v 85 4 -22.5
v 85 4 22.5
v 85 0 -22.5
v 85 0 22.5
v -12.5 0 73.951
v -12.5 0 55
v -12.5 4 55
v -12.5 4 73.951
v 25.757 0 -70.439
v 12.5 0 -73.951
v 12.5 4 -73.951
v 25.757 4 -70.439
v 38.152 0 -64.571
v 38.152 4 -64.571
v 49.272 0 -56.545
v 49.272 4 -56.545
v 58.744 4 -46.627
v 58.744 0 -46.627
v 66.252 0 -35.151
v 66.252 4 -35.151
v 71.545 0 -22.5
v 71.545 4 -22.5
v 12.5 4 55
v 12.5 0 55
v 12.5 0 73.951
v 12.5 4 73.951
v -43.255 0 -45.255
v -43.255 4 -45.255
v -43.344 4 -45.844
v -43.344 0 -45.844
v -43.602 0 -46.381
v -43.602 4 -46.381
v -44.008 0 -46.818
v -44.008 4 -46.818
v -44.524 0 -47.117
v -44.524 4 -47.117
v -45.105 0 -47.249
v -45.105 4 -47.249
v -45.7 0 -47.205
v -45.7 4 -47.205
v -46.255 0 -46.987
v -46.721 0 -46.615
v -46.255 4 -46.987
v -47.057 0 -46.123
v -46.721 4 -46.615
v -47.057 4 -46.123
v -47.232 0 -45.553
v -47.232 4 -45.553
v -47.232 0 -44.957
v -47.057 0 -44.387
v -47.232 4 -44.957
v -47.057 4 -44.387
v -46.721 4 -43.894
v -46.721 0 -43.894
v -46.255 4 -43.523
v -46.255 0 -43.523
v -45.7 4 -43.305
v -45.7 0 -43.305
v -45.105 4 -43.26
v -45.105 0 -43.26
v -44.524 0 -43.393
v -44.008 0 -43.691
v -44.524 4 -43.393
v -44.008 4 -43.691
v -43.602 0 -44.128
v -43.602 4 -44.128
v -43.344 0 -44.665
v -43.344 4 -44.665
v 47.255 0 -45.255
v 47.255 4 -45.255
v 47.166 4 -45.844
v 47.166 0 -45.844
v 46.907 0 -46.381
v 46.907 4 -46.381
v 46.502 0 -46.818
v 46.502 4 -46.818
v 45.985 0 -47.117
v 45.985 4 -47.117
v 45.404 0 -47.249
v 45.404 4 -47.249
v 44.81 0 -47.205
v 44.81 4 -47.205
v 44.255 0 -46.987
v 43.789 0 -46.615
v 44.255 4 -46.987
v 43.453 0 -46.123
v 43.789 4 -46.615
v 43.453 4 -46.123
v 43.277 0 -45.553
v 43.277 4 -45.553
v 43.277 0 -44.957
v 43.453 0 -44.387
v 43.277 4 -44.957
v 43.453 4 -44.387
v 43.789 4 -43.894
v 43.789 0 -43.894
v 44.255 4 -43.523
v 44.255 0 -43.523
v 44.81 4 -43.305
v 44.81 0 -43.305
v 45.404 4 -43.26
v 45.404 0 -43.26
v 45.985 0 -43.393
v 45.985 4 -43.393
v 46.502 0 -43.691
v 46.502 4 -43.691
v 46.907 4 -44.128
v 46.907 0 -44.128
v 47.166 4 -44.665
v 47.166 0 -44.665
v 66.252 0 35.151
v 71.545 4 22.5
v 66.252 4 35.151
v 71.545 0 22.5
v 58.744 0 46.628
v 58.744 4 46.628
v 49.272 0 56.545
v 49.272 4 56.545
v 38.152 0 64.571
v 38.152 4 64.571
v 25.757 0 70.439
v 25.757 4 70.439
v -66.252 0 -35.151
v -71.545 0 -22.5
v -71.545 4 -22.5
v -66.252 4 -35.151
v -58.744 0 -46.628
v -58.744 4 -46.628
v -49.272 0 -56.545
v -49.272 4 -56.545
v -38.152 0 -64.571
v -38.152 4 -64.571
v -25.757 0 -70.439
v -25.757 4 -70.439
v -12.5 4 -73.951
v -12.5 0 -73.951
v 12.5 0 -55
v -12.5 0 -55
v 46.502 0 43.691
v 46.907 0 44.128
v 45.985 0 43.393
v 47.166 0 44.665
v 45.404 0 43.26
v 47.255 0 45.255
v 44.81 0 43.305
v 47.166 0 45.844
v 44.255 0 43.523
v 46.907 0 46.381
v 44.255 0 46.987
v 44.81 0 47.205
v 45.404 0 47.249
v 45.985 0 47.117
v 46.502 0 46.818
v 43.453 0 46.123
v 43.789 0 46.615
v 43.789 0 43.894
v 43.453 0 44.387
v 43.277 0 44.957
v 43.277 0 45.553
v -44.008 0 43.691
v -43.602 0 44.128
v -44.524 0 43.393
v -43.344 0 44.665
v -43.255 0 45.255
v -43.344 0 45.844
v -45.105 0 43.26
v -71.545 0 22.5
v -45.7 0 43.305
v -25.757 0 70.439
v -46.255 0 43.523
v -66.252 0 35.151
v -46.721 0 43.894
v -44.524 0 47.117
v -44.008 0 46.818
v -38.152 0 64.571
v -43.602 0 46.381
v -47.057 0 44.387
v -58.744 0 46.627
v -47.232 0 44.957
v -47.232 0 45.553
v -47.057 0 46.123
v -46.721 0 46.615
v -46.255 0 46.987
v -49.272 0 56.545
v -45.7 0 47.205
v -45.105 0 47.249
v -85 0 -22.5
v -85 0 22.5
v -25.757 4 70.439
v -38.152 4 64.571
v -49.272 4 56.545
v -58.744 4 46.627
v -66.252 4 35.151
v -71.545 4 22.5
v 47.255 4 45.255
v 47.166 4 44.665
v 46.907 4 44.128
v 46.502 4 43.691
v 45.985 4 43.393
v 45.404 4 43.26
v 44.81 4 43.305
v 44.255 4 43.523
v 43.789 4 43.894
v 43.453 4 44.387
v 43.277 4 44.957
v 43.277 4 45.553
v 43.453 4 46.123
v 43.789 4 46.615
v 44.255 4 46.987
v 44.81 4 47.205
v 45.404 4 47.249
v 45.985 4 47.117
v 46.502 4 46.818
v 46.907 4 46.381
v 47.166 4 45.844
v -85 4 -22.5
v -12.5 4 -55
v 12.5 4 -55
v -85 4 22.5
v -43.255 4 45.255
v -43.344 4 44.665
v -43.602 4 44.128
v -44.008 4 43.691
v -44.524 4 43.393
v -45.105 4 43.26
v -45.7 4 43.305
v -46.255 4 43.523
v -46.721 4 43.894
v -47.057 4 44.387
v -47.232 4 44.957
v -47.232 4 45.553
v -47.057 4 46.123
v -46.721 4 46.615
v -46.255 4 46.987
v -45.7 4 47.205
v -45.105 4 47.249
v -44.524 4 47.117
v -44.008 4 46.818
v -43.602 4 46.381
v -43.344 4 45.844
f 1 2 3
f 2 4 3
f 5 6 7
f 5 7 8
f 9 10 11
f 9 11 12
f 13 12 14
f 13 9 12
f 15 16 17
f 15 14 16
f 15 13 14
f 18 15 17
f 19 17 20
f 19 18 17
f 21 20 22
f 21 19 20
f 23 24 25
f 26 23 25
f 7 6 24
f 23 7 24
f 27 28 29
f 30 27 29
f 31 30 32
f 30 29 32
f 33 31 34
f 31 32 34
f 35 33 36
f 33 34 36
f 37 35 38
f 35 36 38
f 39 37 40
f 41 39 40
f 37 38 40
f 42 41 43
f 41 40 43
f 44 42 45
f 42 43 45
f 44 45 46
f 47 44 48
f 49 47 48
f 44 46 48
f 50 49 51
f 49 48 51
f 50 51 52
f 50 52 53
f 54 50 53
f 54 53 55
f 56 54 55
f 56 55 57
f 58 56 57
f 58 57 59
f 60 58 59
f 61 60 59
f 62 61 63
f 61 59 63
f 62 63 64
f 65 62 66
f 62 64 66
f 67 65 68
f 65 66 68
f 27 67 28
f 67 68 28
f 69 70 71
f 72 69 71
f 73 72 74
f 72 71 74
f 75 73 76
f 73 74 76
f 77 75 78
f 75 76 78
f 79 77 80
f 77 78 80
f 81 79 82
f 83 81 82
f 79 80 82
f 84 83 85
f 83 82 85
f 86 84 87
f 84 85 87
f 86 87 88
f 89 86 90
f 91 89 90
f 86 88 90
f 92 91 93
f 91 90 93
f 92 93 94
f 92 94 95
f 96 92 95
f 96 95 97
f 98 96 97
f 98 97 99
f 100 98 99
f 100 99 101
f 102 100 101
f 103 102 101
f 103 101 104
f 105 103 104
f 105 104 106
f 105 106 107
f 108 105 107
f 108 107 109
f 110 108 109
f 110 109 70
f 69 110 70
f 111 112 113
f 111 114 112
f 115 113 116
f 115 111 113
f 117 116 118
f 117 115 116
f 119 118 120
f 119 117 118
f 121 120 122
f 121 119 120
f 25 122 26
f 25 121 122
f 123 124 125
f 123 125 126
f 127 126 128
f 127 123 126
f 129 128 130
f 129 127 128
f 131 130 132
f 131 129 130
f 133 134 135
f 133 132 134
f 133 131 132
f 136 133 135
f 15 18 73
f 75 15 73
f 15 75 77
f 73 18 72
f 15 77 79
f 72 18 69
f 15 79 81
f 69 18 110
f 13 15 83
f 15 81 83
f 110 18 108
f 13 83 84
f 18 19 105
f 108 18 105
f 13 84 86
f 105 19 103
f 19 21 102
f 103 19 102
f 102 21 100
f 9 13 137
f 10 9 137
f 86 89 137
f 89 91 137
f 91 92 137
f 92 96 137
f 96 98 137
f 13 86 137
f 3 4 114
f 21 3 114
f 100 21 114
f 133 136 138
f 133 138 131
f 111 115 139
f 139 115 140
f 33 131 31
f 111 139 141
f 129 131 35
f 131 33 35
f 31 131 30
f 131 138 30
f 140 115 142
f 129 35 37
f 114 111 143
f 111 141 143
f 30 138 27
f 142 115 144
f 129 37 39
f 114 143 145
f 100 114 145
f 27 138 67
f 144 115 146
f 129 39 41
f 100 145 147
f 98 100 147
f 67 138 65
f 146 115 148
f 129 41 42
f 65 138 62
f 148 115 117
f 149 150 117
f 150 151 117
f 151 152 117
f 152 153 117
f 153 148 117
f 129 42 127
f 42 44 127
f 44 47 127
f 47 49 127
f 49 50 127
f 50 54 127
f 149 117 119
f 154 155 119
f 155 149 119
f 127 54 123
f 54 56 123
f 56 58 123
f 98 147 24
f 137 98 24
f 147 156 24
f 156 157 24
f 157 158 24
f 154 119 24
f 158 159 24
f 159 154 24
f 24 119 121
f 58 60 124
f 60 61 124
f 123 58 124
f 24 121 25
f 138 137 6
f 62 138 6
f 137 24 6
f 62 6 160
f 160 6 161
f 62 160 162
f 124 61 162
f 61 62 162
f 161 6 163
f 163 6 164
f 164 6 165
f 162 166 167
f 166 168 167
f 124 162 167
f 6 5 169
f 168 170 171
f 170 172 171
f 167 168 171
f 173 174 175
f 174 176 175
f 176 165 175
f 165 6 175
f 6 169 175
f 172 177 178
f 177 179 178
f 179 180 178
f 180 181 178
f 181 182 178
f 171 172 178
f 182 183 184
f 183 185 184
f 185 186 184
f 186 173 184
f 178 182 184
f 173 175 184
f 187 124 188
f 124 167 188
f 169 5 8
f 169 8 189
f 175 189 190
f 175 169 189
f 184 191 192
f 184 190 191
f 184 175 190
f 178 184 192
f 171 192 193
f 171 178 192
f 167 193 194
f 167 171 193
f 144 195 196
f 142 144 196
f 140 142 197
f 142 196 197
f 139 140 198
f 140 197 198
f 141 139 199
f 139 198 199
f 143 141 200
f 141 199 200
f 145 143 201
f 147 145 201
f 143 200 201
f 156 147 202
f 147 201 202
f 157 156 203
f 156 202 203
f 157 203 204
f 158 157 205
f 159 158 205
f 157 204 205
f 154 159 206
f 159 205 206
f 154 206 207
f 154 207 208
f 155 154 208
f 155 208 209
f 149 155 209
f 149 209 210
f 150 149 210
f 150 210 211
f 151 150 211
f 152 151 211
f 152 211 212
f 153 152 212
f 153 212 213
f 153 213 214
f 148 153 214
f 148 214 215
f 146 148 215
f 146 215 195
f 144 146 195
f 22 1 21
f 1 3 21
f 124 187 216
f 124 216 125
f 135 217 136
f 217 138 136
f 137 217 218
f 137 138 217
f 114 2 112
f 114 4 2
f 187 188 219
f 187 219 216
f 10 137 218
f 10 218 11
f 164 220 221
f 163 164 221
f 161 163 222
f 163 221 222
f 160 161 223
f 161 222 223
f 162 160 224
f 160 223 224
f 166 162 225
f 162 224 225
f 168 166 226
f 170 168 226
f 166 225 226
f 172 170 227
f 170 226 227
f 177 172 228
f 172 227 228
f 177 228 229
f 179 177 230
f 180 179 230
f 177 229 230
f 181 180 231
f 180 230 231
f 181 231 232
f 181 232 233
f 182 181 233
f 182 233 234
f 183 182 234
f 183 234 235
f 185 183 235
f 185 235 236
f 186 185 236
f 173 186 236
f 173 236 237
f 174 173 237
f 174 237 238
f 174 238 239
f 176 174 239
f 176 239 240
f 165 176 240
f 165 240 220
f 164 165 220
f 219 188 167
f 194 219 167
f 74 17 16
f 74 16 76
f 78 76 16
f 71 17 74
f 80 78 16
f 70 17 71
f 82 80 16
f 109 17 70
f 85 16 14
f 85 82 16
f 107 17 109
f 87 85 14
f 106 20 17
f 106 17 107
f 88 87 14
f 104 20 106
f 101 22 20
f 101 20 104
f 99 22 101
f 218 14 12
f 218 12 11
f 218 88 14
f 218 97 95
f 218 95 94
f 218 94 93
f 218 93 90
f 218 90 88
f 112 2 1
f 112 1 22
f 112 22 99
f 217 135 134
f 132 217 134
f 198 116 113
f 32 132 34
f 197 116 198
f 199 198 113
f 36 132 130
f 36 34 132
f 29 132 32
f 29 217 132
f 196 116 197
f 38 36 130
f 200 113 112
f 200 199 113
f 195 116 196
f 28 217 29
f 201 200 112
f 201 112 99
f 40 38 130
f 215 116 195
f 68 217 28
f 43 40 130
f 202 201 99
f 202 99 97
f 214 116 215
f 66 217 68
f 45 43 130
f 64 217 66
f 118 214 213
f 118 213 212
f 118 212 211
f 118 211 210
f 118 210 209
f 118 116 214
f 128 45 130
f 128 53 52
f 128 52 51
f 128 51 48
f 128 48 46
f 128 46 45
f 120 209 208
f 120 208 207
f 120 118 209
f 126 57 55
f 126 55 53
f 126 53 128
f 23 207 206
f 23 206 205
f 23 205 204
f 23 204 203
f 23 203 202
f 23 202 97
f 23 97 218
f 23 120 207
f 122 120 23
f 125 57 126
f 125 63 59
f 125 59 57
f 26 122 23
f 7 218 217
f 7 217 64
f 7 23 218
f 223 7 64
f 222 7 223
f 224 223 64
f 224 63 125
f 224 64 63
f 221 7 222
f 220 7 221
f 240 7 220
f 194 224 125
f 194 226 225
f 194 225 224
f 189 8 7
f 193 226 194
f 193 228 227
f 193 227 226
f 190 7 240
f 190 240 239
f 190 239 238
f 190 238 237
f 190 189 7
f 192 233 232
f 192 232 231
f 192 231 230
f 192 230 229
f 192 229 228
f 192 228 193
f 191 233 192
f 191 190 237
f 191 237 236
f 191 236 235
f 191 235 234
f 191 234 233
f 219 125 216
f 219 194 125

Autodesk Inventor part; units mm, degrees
ref_plane "YZ Plane" through (0, 0, 0) normal (1, 0, 0) x (0, 1, 0)
ref_plane "XZ Plane" through (0, 0, 0) normal (0, 1, 0) x (-1, 0, 0)
ref_plane "XY Plane" through (0, 0, 0) normal (0, 0, 1) x (1, 0, 0)
sketch "Boceto1" plane through (0, 0, 0) normal (0, 1, 0) x (-1, 0, 0)
  line L0 (0, -55) -> (12.5, -55)
  line L1 (12.5, -55) -> (12.5, -73.951)
  line L2 (0, -55) -> (-12.5, -55)
  line L3 (-12.5, -55) -> (-12.5, -73.951)
  line L4 (0, 55) -> (12.5, 55)
  line L5 (12.5, 55) -> (12.5, 73.951)
  line L6 (0, 55) -> (-12.5, 55)
  line L7 (-12.5, 55) -> (-12.5, 73.951)
  line L8 (85, 0) -> (85, -22.5)
  line L9 (85, -22.5) -> (71.5454, -22.5)
  line L10 (85, 0) -> (85, 22.5)
  line L11 (85, 22.5) -> (71.5454, 22.5)
  line L12 (-85, 0) -> (-85, -22.5)
  line L13 (-85, -22.5) -> (-71.5454, -22.5)
  line L14 (-85, 0) -> (-85, 22.5)
  line L15 (-85, 22.5) -> (-71.5454, 22.5)
  arc A0 (12.5, -73.951) -> (71.5454, -22.5) centre (0, 0) ccw
  arc A1 (71.5454, 22.5) -> (12.5, 73.951) centre (0, 0) ccw
  arc A2 (-12.5, 73.951) -> (-71.5454, 22.5) centre (0, 0) ccw
  arc A3 (-71.5454, -22.5) -> (-12.5, -73.951) centre (0, 0) ccw
  dimension "d2" = 12.5
  dimension "d4" = 22.5
extrude "Extrusión1" add sketch "Boceto1" along normal blind 4
sketch "Boceto2" plane through (0, 4, 0) normal (0, 1, 0) x (1, 0, 0)
  circle A0 centre (0, 0) radius 64
  line L0 (0, 0) -> (64, 0) construction
  circle A1 centre (45.2548, 45.2548) radius 2
  circle A2 centre (-45.2548, 45.2548) radius 2
  circle A3 centre (-45.2548, -45.2548) radius 2
  circle A4 centre (45.2548, -45.2548) radius 2
  dimension "d9" = 4
  dimension "d12" = 360
extrude "Extrusión2" cut sketch "Boceto2" against normal blind 4 contours A1 A0 | A0 A1 | A4 A0 | A0 A4 | A2 A0 | A0 A2 | A3 A0 | A0 A3
properties part number "Base_inferior"
